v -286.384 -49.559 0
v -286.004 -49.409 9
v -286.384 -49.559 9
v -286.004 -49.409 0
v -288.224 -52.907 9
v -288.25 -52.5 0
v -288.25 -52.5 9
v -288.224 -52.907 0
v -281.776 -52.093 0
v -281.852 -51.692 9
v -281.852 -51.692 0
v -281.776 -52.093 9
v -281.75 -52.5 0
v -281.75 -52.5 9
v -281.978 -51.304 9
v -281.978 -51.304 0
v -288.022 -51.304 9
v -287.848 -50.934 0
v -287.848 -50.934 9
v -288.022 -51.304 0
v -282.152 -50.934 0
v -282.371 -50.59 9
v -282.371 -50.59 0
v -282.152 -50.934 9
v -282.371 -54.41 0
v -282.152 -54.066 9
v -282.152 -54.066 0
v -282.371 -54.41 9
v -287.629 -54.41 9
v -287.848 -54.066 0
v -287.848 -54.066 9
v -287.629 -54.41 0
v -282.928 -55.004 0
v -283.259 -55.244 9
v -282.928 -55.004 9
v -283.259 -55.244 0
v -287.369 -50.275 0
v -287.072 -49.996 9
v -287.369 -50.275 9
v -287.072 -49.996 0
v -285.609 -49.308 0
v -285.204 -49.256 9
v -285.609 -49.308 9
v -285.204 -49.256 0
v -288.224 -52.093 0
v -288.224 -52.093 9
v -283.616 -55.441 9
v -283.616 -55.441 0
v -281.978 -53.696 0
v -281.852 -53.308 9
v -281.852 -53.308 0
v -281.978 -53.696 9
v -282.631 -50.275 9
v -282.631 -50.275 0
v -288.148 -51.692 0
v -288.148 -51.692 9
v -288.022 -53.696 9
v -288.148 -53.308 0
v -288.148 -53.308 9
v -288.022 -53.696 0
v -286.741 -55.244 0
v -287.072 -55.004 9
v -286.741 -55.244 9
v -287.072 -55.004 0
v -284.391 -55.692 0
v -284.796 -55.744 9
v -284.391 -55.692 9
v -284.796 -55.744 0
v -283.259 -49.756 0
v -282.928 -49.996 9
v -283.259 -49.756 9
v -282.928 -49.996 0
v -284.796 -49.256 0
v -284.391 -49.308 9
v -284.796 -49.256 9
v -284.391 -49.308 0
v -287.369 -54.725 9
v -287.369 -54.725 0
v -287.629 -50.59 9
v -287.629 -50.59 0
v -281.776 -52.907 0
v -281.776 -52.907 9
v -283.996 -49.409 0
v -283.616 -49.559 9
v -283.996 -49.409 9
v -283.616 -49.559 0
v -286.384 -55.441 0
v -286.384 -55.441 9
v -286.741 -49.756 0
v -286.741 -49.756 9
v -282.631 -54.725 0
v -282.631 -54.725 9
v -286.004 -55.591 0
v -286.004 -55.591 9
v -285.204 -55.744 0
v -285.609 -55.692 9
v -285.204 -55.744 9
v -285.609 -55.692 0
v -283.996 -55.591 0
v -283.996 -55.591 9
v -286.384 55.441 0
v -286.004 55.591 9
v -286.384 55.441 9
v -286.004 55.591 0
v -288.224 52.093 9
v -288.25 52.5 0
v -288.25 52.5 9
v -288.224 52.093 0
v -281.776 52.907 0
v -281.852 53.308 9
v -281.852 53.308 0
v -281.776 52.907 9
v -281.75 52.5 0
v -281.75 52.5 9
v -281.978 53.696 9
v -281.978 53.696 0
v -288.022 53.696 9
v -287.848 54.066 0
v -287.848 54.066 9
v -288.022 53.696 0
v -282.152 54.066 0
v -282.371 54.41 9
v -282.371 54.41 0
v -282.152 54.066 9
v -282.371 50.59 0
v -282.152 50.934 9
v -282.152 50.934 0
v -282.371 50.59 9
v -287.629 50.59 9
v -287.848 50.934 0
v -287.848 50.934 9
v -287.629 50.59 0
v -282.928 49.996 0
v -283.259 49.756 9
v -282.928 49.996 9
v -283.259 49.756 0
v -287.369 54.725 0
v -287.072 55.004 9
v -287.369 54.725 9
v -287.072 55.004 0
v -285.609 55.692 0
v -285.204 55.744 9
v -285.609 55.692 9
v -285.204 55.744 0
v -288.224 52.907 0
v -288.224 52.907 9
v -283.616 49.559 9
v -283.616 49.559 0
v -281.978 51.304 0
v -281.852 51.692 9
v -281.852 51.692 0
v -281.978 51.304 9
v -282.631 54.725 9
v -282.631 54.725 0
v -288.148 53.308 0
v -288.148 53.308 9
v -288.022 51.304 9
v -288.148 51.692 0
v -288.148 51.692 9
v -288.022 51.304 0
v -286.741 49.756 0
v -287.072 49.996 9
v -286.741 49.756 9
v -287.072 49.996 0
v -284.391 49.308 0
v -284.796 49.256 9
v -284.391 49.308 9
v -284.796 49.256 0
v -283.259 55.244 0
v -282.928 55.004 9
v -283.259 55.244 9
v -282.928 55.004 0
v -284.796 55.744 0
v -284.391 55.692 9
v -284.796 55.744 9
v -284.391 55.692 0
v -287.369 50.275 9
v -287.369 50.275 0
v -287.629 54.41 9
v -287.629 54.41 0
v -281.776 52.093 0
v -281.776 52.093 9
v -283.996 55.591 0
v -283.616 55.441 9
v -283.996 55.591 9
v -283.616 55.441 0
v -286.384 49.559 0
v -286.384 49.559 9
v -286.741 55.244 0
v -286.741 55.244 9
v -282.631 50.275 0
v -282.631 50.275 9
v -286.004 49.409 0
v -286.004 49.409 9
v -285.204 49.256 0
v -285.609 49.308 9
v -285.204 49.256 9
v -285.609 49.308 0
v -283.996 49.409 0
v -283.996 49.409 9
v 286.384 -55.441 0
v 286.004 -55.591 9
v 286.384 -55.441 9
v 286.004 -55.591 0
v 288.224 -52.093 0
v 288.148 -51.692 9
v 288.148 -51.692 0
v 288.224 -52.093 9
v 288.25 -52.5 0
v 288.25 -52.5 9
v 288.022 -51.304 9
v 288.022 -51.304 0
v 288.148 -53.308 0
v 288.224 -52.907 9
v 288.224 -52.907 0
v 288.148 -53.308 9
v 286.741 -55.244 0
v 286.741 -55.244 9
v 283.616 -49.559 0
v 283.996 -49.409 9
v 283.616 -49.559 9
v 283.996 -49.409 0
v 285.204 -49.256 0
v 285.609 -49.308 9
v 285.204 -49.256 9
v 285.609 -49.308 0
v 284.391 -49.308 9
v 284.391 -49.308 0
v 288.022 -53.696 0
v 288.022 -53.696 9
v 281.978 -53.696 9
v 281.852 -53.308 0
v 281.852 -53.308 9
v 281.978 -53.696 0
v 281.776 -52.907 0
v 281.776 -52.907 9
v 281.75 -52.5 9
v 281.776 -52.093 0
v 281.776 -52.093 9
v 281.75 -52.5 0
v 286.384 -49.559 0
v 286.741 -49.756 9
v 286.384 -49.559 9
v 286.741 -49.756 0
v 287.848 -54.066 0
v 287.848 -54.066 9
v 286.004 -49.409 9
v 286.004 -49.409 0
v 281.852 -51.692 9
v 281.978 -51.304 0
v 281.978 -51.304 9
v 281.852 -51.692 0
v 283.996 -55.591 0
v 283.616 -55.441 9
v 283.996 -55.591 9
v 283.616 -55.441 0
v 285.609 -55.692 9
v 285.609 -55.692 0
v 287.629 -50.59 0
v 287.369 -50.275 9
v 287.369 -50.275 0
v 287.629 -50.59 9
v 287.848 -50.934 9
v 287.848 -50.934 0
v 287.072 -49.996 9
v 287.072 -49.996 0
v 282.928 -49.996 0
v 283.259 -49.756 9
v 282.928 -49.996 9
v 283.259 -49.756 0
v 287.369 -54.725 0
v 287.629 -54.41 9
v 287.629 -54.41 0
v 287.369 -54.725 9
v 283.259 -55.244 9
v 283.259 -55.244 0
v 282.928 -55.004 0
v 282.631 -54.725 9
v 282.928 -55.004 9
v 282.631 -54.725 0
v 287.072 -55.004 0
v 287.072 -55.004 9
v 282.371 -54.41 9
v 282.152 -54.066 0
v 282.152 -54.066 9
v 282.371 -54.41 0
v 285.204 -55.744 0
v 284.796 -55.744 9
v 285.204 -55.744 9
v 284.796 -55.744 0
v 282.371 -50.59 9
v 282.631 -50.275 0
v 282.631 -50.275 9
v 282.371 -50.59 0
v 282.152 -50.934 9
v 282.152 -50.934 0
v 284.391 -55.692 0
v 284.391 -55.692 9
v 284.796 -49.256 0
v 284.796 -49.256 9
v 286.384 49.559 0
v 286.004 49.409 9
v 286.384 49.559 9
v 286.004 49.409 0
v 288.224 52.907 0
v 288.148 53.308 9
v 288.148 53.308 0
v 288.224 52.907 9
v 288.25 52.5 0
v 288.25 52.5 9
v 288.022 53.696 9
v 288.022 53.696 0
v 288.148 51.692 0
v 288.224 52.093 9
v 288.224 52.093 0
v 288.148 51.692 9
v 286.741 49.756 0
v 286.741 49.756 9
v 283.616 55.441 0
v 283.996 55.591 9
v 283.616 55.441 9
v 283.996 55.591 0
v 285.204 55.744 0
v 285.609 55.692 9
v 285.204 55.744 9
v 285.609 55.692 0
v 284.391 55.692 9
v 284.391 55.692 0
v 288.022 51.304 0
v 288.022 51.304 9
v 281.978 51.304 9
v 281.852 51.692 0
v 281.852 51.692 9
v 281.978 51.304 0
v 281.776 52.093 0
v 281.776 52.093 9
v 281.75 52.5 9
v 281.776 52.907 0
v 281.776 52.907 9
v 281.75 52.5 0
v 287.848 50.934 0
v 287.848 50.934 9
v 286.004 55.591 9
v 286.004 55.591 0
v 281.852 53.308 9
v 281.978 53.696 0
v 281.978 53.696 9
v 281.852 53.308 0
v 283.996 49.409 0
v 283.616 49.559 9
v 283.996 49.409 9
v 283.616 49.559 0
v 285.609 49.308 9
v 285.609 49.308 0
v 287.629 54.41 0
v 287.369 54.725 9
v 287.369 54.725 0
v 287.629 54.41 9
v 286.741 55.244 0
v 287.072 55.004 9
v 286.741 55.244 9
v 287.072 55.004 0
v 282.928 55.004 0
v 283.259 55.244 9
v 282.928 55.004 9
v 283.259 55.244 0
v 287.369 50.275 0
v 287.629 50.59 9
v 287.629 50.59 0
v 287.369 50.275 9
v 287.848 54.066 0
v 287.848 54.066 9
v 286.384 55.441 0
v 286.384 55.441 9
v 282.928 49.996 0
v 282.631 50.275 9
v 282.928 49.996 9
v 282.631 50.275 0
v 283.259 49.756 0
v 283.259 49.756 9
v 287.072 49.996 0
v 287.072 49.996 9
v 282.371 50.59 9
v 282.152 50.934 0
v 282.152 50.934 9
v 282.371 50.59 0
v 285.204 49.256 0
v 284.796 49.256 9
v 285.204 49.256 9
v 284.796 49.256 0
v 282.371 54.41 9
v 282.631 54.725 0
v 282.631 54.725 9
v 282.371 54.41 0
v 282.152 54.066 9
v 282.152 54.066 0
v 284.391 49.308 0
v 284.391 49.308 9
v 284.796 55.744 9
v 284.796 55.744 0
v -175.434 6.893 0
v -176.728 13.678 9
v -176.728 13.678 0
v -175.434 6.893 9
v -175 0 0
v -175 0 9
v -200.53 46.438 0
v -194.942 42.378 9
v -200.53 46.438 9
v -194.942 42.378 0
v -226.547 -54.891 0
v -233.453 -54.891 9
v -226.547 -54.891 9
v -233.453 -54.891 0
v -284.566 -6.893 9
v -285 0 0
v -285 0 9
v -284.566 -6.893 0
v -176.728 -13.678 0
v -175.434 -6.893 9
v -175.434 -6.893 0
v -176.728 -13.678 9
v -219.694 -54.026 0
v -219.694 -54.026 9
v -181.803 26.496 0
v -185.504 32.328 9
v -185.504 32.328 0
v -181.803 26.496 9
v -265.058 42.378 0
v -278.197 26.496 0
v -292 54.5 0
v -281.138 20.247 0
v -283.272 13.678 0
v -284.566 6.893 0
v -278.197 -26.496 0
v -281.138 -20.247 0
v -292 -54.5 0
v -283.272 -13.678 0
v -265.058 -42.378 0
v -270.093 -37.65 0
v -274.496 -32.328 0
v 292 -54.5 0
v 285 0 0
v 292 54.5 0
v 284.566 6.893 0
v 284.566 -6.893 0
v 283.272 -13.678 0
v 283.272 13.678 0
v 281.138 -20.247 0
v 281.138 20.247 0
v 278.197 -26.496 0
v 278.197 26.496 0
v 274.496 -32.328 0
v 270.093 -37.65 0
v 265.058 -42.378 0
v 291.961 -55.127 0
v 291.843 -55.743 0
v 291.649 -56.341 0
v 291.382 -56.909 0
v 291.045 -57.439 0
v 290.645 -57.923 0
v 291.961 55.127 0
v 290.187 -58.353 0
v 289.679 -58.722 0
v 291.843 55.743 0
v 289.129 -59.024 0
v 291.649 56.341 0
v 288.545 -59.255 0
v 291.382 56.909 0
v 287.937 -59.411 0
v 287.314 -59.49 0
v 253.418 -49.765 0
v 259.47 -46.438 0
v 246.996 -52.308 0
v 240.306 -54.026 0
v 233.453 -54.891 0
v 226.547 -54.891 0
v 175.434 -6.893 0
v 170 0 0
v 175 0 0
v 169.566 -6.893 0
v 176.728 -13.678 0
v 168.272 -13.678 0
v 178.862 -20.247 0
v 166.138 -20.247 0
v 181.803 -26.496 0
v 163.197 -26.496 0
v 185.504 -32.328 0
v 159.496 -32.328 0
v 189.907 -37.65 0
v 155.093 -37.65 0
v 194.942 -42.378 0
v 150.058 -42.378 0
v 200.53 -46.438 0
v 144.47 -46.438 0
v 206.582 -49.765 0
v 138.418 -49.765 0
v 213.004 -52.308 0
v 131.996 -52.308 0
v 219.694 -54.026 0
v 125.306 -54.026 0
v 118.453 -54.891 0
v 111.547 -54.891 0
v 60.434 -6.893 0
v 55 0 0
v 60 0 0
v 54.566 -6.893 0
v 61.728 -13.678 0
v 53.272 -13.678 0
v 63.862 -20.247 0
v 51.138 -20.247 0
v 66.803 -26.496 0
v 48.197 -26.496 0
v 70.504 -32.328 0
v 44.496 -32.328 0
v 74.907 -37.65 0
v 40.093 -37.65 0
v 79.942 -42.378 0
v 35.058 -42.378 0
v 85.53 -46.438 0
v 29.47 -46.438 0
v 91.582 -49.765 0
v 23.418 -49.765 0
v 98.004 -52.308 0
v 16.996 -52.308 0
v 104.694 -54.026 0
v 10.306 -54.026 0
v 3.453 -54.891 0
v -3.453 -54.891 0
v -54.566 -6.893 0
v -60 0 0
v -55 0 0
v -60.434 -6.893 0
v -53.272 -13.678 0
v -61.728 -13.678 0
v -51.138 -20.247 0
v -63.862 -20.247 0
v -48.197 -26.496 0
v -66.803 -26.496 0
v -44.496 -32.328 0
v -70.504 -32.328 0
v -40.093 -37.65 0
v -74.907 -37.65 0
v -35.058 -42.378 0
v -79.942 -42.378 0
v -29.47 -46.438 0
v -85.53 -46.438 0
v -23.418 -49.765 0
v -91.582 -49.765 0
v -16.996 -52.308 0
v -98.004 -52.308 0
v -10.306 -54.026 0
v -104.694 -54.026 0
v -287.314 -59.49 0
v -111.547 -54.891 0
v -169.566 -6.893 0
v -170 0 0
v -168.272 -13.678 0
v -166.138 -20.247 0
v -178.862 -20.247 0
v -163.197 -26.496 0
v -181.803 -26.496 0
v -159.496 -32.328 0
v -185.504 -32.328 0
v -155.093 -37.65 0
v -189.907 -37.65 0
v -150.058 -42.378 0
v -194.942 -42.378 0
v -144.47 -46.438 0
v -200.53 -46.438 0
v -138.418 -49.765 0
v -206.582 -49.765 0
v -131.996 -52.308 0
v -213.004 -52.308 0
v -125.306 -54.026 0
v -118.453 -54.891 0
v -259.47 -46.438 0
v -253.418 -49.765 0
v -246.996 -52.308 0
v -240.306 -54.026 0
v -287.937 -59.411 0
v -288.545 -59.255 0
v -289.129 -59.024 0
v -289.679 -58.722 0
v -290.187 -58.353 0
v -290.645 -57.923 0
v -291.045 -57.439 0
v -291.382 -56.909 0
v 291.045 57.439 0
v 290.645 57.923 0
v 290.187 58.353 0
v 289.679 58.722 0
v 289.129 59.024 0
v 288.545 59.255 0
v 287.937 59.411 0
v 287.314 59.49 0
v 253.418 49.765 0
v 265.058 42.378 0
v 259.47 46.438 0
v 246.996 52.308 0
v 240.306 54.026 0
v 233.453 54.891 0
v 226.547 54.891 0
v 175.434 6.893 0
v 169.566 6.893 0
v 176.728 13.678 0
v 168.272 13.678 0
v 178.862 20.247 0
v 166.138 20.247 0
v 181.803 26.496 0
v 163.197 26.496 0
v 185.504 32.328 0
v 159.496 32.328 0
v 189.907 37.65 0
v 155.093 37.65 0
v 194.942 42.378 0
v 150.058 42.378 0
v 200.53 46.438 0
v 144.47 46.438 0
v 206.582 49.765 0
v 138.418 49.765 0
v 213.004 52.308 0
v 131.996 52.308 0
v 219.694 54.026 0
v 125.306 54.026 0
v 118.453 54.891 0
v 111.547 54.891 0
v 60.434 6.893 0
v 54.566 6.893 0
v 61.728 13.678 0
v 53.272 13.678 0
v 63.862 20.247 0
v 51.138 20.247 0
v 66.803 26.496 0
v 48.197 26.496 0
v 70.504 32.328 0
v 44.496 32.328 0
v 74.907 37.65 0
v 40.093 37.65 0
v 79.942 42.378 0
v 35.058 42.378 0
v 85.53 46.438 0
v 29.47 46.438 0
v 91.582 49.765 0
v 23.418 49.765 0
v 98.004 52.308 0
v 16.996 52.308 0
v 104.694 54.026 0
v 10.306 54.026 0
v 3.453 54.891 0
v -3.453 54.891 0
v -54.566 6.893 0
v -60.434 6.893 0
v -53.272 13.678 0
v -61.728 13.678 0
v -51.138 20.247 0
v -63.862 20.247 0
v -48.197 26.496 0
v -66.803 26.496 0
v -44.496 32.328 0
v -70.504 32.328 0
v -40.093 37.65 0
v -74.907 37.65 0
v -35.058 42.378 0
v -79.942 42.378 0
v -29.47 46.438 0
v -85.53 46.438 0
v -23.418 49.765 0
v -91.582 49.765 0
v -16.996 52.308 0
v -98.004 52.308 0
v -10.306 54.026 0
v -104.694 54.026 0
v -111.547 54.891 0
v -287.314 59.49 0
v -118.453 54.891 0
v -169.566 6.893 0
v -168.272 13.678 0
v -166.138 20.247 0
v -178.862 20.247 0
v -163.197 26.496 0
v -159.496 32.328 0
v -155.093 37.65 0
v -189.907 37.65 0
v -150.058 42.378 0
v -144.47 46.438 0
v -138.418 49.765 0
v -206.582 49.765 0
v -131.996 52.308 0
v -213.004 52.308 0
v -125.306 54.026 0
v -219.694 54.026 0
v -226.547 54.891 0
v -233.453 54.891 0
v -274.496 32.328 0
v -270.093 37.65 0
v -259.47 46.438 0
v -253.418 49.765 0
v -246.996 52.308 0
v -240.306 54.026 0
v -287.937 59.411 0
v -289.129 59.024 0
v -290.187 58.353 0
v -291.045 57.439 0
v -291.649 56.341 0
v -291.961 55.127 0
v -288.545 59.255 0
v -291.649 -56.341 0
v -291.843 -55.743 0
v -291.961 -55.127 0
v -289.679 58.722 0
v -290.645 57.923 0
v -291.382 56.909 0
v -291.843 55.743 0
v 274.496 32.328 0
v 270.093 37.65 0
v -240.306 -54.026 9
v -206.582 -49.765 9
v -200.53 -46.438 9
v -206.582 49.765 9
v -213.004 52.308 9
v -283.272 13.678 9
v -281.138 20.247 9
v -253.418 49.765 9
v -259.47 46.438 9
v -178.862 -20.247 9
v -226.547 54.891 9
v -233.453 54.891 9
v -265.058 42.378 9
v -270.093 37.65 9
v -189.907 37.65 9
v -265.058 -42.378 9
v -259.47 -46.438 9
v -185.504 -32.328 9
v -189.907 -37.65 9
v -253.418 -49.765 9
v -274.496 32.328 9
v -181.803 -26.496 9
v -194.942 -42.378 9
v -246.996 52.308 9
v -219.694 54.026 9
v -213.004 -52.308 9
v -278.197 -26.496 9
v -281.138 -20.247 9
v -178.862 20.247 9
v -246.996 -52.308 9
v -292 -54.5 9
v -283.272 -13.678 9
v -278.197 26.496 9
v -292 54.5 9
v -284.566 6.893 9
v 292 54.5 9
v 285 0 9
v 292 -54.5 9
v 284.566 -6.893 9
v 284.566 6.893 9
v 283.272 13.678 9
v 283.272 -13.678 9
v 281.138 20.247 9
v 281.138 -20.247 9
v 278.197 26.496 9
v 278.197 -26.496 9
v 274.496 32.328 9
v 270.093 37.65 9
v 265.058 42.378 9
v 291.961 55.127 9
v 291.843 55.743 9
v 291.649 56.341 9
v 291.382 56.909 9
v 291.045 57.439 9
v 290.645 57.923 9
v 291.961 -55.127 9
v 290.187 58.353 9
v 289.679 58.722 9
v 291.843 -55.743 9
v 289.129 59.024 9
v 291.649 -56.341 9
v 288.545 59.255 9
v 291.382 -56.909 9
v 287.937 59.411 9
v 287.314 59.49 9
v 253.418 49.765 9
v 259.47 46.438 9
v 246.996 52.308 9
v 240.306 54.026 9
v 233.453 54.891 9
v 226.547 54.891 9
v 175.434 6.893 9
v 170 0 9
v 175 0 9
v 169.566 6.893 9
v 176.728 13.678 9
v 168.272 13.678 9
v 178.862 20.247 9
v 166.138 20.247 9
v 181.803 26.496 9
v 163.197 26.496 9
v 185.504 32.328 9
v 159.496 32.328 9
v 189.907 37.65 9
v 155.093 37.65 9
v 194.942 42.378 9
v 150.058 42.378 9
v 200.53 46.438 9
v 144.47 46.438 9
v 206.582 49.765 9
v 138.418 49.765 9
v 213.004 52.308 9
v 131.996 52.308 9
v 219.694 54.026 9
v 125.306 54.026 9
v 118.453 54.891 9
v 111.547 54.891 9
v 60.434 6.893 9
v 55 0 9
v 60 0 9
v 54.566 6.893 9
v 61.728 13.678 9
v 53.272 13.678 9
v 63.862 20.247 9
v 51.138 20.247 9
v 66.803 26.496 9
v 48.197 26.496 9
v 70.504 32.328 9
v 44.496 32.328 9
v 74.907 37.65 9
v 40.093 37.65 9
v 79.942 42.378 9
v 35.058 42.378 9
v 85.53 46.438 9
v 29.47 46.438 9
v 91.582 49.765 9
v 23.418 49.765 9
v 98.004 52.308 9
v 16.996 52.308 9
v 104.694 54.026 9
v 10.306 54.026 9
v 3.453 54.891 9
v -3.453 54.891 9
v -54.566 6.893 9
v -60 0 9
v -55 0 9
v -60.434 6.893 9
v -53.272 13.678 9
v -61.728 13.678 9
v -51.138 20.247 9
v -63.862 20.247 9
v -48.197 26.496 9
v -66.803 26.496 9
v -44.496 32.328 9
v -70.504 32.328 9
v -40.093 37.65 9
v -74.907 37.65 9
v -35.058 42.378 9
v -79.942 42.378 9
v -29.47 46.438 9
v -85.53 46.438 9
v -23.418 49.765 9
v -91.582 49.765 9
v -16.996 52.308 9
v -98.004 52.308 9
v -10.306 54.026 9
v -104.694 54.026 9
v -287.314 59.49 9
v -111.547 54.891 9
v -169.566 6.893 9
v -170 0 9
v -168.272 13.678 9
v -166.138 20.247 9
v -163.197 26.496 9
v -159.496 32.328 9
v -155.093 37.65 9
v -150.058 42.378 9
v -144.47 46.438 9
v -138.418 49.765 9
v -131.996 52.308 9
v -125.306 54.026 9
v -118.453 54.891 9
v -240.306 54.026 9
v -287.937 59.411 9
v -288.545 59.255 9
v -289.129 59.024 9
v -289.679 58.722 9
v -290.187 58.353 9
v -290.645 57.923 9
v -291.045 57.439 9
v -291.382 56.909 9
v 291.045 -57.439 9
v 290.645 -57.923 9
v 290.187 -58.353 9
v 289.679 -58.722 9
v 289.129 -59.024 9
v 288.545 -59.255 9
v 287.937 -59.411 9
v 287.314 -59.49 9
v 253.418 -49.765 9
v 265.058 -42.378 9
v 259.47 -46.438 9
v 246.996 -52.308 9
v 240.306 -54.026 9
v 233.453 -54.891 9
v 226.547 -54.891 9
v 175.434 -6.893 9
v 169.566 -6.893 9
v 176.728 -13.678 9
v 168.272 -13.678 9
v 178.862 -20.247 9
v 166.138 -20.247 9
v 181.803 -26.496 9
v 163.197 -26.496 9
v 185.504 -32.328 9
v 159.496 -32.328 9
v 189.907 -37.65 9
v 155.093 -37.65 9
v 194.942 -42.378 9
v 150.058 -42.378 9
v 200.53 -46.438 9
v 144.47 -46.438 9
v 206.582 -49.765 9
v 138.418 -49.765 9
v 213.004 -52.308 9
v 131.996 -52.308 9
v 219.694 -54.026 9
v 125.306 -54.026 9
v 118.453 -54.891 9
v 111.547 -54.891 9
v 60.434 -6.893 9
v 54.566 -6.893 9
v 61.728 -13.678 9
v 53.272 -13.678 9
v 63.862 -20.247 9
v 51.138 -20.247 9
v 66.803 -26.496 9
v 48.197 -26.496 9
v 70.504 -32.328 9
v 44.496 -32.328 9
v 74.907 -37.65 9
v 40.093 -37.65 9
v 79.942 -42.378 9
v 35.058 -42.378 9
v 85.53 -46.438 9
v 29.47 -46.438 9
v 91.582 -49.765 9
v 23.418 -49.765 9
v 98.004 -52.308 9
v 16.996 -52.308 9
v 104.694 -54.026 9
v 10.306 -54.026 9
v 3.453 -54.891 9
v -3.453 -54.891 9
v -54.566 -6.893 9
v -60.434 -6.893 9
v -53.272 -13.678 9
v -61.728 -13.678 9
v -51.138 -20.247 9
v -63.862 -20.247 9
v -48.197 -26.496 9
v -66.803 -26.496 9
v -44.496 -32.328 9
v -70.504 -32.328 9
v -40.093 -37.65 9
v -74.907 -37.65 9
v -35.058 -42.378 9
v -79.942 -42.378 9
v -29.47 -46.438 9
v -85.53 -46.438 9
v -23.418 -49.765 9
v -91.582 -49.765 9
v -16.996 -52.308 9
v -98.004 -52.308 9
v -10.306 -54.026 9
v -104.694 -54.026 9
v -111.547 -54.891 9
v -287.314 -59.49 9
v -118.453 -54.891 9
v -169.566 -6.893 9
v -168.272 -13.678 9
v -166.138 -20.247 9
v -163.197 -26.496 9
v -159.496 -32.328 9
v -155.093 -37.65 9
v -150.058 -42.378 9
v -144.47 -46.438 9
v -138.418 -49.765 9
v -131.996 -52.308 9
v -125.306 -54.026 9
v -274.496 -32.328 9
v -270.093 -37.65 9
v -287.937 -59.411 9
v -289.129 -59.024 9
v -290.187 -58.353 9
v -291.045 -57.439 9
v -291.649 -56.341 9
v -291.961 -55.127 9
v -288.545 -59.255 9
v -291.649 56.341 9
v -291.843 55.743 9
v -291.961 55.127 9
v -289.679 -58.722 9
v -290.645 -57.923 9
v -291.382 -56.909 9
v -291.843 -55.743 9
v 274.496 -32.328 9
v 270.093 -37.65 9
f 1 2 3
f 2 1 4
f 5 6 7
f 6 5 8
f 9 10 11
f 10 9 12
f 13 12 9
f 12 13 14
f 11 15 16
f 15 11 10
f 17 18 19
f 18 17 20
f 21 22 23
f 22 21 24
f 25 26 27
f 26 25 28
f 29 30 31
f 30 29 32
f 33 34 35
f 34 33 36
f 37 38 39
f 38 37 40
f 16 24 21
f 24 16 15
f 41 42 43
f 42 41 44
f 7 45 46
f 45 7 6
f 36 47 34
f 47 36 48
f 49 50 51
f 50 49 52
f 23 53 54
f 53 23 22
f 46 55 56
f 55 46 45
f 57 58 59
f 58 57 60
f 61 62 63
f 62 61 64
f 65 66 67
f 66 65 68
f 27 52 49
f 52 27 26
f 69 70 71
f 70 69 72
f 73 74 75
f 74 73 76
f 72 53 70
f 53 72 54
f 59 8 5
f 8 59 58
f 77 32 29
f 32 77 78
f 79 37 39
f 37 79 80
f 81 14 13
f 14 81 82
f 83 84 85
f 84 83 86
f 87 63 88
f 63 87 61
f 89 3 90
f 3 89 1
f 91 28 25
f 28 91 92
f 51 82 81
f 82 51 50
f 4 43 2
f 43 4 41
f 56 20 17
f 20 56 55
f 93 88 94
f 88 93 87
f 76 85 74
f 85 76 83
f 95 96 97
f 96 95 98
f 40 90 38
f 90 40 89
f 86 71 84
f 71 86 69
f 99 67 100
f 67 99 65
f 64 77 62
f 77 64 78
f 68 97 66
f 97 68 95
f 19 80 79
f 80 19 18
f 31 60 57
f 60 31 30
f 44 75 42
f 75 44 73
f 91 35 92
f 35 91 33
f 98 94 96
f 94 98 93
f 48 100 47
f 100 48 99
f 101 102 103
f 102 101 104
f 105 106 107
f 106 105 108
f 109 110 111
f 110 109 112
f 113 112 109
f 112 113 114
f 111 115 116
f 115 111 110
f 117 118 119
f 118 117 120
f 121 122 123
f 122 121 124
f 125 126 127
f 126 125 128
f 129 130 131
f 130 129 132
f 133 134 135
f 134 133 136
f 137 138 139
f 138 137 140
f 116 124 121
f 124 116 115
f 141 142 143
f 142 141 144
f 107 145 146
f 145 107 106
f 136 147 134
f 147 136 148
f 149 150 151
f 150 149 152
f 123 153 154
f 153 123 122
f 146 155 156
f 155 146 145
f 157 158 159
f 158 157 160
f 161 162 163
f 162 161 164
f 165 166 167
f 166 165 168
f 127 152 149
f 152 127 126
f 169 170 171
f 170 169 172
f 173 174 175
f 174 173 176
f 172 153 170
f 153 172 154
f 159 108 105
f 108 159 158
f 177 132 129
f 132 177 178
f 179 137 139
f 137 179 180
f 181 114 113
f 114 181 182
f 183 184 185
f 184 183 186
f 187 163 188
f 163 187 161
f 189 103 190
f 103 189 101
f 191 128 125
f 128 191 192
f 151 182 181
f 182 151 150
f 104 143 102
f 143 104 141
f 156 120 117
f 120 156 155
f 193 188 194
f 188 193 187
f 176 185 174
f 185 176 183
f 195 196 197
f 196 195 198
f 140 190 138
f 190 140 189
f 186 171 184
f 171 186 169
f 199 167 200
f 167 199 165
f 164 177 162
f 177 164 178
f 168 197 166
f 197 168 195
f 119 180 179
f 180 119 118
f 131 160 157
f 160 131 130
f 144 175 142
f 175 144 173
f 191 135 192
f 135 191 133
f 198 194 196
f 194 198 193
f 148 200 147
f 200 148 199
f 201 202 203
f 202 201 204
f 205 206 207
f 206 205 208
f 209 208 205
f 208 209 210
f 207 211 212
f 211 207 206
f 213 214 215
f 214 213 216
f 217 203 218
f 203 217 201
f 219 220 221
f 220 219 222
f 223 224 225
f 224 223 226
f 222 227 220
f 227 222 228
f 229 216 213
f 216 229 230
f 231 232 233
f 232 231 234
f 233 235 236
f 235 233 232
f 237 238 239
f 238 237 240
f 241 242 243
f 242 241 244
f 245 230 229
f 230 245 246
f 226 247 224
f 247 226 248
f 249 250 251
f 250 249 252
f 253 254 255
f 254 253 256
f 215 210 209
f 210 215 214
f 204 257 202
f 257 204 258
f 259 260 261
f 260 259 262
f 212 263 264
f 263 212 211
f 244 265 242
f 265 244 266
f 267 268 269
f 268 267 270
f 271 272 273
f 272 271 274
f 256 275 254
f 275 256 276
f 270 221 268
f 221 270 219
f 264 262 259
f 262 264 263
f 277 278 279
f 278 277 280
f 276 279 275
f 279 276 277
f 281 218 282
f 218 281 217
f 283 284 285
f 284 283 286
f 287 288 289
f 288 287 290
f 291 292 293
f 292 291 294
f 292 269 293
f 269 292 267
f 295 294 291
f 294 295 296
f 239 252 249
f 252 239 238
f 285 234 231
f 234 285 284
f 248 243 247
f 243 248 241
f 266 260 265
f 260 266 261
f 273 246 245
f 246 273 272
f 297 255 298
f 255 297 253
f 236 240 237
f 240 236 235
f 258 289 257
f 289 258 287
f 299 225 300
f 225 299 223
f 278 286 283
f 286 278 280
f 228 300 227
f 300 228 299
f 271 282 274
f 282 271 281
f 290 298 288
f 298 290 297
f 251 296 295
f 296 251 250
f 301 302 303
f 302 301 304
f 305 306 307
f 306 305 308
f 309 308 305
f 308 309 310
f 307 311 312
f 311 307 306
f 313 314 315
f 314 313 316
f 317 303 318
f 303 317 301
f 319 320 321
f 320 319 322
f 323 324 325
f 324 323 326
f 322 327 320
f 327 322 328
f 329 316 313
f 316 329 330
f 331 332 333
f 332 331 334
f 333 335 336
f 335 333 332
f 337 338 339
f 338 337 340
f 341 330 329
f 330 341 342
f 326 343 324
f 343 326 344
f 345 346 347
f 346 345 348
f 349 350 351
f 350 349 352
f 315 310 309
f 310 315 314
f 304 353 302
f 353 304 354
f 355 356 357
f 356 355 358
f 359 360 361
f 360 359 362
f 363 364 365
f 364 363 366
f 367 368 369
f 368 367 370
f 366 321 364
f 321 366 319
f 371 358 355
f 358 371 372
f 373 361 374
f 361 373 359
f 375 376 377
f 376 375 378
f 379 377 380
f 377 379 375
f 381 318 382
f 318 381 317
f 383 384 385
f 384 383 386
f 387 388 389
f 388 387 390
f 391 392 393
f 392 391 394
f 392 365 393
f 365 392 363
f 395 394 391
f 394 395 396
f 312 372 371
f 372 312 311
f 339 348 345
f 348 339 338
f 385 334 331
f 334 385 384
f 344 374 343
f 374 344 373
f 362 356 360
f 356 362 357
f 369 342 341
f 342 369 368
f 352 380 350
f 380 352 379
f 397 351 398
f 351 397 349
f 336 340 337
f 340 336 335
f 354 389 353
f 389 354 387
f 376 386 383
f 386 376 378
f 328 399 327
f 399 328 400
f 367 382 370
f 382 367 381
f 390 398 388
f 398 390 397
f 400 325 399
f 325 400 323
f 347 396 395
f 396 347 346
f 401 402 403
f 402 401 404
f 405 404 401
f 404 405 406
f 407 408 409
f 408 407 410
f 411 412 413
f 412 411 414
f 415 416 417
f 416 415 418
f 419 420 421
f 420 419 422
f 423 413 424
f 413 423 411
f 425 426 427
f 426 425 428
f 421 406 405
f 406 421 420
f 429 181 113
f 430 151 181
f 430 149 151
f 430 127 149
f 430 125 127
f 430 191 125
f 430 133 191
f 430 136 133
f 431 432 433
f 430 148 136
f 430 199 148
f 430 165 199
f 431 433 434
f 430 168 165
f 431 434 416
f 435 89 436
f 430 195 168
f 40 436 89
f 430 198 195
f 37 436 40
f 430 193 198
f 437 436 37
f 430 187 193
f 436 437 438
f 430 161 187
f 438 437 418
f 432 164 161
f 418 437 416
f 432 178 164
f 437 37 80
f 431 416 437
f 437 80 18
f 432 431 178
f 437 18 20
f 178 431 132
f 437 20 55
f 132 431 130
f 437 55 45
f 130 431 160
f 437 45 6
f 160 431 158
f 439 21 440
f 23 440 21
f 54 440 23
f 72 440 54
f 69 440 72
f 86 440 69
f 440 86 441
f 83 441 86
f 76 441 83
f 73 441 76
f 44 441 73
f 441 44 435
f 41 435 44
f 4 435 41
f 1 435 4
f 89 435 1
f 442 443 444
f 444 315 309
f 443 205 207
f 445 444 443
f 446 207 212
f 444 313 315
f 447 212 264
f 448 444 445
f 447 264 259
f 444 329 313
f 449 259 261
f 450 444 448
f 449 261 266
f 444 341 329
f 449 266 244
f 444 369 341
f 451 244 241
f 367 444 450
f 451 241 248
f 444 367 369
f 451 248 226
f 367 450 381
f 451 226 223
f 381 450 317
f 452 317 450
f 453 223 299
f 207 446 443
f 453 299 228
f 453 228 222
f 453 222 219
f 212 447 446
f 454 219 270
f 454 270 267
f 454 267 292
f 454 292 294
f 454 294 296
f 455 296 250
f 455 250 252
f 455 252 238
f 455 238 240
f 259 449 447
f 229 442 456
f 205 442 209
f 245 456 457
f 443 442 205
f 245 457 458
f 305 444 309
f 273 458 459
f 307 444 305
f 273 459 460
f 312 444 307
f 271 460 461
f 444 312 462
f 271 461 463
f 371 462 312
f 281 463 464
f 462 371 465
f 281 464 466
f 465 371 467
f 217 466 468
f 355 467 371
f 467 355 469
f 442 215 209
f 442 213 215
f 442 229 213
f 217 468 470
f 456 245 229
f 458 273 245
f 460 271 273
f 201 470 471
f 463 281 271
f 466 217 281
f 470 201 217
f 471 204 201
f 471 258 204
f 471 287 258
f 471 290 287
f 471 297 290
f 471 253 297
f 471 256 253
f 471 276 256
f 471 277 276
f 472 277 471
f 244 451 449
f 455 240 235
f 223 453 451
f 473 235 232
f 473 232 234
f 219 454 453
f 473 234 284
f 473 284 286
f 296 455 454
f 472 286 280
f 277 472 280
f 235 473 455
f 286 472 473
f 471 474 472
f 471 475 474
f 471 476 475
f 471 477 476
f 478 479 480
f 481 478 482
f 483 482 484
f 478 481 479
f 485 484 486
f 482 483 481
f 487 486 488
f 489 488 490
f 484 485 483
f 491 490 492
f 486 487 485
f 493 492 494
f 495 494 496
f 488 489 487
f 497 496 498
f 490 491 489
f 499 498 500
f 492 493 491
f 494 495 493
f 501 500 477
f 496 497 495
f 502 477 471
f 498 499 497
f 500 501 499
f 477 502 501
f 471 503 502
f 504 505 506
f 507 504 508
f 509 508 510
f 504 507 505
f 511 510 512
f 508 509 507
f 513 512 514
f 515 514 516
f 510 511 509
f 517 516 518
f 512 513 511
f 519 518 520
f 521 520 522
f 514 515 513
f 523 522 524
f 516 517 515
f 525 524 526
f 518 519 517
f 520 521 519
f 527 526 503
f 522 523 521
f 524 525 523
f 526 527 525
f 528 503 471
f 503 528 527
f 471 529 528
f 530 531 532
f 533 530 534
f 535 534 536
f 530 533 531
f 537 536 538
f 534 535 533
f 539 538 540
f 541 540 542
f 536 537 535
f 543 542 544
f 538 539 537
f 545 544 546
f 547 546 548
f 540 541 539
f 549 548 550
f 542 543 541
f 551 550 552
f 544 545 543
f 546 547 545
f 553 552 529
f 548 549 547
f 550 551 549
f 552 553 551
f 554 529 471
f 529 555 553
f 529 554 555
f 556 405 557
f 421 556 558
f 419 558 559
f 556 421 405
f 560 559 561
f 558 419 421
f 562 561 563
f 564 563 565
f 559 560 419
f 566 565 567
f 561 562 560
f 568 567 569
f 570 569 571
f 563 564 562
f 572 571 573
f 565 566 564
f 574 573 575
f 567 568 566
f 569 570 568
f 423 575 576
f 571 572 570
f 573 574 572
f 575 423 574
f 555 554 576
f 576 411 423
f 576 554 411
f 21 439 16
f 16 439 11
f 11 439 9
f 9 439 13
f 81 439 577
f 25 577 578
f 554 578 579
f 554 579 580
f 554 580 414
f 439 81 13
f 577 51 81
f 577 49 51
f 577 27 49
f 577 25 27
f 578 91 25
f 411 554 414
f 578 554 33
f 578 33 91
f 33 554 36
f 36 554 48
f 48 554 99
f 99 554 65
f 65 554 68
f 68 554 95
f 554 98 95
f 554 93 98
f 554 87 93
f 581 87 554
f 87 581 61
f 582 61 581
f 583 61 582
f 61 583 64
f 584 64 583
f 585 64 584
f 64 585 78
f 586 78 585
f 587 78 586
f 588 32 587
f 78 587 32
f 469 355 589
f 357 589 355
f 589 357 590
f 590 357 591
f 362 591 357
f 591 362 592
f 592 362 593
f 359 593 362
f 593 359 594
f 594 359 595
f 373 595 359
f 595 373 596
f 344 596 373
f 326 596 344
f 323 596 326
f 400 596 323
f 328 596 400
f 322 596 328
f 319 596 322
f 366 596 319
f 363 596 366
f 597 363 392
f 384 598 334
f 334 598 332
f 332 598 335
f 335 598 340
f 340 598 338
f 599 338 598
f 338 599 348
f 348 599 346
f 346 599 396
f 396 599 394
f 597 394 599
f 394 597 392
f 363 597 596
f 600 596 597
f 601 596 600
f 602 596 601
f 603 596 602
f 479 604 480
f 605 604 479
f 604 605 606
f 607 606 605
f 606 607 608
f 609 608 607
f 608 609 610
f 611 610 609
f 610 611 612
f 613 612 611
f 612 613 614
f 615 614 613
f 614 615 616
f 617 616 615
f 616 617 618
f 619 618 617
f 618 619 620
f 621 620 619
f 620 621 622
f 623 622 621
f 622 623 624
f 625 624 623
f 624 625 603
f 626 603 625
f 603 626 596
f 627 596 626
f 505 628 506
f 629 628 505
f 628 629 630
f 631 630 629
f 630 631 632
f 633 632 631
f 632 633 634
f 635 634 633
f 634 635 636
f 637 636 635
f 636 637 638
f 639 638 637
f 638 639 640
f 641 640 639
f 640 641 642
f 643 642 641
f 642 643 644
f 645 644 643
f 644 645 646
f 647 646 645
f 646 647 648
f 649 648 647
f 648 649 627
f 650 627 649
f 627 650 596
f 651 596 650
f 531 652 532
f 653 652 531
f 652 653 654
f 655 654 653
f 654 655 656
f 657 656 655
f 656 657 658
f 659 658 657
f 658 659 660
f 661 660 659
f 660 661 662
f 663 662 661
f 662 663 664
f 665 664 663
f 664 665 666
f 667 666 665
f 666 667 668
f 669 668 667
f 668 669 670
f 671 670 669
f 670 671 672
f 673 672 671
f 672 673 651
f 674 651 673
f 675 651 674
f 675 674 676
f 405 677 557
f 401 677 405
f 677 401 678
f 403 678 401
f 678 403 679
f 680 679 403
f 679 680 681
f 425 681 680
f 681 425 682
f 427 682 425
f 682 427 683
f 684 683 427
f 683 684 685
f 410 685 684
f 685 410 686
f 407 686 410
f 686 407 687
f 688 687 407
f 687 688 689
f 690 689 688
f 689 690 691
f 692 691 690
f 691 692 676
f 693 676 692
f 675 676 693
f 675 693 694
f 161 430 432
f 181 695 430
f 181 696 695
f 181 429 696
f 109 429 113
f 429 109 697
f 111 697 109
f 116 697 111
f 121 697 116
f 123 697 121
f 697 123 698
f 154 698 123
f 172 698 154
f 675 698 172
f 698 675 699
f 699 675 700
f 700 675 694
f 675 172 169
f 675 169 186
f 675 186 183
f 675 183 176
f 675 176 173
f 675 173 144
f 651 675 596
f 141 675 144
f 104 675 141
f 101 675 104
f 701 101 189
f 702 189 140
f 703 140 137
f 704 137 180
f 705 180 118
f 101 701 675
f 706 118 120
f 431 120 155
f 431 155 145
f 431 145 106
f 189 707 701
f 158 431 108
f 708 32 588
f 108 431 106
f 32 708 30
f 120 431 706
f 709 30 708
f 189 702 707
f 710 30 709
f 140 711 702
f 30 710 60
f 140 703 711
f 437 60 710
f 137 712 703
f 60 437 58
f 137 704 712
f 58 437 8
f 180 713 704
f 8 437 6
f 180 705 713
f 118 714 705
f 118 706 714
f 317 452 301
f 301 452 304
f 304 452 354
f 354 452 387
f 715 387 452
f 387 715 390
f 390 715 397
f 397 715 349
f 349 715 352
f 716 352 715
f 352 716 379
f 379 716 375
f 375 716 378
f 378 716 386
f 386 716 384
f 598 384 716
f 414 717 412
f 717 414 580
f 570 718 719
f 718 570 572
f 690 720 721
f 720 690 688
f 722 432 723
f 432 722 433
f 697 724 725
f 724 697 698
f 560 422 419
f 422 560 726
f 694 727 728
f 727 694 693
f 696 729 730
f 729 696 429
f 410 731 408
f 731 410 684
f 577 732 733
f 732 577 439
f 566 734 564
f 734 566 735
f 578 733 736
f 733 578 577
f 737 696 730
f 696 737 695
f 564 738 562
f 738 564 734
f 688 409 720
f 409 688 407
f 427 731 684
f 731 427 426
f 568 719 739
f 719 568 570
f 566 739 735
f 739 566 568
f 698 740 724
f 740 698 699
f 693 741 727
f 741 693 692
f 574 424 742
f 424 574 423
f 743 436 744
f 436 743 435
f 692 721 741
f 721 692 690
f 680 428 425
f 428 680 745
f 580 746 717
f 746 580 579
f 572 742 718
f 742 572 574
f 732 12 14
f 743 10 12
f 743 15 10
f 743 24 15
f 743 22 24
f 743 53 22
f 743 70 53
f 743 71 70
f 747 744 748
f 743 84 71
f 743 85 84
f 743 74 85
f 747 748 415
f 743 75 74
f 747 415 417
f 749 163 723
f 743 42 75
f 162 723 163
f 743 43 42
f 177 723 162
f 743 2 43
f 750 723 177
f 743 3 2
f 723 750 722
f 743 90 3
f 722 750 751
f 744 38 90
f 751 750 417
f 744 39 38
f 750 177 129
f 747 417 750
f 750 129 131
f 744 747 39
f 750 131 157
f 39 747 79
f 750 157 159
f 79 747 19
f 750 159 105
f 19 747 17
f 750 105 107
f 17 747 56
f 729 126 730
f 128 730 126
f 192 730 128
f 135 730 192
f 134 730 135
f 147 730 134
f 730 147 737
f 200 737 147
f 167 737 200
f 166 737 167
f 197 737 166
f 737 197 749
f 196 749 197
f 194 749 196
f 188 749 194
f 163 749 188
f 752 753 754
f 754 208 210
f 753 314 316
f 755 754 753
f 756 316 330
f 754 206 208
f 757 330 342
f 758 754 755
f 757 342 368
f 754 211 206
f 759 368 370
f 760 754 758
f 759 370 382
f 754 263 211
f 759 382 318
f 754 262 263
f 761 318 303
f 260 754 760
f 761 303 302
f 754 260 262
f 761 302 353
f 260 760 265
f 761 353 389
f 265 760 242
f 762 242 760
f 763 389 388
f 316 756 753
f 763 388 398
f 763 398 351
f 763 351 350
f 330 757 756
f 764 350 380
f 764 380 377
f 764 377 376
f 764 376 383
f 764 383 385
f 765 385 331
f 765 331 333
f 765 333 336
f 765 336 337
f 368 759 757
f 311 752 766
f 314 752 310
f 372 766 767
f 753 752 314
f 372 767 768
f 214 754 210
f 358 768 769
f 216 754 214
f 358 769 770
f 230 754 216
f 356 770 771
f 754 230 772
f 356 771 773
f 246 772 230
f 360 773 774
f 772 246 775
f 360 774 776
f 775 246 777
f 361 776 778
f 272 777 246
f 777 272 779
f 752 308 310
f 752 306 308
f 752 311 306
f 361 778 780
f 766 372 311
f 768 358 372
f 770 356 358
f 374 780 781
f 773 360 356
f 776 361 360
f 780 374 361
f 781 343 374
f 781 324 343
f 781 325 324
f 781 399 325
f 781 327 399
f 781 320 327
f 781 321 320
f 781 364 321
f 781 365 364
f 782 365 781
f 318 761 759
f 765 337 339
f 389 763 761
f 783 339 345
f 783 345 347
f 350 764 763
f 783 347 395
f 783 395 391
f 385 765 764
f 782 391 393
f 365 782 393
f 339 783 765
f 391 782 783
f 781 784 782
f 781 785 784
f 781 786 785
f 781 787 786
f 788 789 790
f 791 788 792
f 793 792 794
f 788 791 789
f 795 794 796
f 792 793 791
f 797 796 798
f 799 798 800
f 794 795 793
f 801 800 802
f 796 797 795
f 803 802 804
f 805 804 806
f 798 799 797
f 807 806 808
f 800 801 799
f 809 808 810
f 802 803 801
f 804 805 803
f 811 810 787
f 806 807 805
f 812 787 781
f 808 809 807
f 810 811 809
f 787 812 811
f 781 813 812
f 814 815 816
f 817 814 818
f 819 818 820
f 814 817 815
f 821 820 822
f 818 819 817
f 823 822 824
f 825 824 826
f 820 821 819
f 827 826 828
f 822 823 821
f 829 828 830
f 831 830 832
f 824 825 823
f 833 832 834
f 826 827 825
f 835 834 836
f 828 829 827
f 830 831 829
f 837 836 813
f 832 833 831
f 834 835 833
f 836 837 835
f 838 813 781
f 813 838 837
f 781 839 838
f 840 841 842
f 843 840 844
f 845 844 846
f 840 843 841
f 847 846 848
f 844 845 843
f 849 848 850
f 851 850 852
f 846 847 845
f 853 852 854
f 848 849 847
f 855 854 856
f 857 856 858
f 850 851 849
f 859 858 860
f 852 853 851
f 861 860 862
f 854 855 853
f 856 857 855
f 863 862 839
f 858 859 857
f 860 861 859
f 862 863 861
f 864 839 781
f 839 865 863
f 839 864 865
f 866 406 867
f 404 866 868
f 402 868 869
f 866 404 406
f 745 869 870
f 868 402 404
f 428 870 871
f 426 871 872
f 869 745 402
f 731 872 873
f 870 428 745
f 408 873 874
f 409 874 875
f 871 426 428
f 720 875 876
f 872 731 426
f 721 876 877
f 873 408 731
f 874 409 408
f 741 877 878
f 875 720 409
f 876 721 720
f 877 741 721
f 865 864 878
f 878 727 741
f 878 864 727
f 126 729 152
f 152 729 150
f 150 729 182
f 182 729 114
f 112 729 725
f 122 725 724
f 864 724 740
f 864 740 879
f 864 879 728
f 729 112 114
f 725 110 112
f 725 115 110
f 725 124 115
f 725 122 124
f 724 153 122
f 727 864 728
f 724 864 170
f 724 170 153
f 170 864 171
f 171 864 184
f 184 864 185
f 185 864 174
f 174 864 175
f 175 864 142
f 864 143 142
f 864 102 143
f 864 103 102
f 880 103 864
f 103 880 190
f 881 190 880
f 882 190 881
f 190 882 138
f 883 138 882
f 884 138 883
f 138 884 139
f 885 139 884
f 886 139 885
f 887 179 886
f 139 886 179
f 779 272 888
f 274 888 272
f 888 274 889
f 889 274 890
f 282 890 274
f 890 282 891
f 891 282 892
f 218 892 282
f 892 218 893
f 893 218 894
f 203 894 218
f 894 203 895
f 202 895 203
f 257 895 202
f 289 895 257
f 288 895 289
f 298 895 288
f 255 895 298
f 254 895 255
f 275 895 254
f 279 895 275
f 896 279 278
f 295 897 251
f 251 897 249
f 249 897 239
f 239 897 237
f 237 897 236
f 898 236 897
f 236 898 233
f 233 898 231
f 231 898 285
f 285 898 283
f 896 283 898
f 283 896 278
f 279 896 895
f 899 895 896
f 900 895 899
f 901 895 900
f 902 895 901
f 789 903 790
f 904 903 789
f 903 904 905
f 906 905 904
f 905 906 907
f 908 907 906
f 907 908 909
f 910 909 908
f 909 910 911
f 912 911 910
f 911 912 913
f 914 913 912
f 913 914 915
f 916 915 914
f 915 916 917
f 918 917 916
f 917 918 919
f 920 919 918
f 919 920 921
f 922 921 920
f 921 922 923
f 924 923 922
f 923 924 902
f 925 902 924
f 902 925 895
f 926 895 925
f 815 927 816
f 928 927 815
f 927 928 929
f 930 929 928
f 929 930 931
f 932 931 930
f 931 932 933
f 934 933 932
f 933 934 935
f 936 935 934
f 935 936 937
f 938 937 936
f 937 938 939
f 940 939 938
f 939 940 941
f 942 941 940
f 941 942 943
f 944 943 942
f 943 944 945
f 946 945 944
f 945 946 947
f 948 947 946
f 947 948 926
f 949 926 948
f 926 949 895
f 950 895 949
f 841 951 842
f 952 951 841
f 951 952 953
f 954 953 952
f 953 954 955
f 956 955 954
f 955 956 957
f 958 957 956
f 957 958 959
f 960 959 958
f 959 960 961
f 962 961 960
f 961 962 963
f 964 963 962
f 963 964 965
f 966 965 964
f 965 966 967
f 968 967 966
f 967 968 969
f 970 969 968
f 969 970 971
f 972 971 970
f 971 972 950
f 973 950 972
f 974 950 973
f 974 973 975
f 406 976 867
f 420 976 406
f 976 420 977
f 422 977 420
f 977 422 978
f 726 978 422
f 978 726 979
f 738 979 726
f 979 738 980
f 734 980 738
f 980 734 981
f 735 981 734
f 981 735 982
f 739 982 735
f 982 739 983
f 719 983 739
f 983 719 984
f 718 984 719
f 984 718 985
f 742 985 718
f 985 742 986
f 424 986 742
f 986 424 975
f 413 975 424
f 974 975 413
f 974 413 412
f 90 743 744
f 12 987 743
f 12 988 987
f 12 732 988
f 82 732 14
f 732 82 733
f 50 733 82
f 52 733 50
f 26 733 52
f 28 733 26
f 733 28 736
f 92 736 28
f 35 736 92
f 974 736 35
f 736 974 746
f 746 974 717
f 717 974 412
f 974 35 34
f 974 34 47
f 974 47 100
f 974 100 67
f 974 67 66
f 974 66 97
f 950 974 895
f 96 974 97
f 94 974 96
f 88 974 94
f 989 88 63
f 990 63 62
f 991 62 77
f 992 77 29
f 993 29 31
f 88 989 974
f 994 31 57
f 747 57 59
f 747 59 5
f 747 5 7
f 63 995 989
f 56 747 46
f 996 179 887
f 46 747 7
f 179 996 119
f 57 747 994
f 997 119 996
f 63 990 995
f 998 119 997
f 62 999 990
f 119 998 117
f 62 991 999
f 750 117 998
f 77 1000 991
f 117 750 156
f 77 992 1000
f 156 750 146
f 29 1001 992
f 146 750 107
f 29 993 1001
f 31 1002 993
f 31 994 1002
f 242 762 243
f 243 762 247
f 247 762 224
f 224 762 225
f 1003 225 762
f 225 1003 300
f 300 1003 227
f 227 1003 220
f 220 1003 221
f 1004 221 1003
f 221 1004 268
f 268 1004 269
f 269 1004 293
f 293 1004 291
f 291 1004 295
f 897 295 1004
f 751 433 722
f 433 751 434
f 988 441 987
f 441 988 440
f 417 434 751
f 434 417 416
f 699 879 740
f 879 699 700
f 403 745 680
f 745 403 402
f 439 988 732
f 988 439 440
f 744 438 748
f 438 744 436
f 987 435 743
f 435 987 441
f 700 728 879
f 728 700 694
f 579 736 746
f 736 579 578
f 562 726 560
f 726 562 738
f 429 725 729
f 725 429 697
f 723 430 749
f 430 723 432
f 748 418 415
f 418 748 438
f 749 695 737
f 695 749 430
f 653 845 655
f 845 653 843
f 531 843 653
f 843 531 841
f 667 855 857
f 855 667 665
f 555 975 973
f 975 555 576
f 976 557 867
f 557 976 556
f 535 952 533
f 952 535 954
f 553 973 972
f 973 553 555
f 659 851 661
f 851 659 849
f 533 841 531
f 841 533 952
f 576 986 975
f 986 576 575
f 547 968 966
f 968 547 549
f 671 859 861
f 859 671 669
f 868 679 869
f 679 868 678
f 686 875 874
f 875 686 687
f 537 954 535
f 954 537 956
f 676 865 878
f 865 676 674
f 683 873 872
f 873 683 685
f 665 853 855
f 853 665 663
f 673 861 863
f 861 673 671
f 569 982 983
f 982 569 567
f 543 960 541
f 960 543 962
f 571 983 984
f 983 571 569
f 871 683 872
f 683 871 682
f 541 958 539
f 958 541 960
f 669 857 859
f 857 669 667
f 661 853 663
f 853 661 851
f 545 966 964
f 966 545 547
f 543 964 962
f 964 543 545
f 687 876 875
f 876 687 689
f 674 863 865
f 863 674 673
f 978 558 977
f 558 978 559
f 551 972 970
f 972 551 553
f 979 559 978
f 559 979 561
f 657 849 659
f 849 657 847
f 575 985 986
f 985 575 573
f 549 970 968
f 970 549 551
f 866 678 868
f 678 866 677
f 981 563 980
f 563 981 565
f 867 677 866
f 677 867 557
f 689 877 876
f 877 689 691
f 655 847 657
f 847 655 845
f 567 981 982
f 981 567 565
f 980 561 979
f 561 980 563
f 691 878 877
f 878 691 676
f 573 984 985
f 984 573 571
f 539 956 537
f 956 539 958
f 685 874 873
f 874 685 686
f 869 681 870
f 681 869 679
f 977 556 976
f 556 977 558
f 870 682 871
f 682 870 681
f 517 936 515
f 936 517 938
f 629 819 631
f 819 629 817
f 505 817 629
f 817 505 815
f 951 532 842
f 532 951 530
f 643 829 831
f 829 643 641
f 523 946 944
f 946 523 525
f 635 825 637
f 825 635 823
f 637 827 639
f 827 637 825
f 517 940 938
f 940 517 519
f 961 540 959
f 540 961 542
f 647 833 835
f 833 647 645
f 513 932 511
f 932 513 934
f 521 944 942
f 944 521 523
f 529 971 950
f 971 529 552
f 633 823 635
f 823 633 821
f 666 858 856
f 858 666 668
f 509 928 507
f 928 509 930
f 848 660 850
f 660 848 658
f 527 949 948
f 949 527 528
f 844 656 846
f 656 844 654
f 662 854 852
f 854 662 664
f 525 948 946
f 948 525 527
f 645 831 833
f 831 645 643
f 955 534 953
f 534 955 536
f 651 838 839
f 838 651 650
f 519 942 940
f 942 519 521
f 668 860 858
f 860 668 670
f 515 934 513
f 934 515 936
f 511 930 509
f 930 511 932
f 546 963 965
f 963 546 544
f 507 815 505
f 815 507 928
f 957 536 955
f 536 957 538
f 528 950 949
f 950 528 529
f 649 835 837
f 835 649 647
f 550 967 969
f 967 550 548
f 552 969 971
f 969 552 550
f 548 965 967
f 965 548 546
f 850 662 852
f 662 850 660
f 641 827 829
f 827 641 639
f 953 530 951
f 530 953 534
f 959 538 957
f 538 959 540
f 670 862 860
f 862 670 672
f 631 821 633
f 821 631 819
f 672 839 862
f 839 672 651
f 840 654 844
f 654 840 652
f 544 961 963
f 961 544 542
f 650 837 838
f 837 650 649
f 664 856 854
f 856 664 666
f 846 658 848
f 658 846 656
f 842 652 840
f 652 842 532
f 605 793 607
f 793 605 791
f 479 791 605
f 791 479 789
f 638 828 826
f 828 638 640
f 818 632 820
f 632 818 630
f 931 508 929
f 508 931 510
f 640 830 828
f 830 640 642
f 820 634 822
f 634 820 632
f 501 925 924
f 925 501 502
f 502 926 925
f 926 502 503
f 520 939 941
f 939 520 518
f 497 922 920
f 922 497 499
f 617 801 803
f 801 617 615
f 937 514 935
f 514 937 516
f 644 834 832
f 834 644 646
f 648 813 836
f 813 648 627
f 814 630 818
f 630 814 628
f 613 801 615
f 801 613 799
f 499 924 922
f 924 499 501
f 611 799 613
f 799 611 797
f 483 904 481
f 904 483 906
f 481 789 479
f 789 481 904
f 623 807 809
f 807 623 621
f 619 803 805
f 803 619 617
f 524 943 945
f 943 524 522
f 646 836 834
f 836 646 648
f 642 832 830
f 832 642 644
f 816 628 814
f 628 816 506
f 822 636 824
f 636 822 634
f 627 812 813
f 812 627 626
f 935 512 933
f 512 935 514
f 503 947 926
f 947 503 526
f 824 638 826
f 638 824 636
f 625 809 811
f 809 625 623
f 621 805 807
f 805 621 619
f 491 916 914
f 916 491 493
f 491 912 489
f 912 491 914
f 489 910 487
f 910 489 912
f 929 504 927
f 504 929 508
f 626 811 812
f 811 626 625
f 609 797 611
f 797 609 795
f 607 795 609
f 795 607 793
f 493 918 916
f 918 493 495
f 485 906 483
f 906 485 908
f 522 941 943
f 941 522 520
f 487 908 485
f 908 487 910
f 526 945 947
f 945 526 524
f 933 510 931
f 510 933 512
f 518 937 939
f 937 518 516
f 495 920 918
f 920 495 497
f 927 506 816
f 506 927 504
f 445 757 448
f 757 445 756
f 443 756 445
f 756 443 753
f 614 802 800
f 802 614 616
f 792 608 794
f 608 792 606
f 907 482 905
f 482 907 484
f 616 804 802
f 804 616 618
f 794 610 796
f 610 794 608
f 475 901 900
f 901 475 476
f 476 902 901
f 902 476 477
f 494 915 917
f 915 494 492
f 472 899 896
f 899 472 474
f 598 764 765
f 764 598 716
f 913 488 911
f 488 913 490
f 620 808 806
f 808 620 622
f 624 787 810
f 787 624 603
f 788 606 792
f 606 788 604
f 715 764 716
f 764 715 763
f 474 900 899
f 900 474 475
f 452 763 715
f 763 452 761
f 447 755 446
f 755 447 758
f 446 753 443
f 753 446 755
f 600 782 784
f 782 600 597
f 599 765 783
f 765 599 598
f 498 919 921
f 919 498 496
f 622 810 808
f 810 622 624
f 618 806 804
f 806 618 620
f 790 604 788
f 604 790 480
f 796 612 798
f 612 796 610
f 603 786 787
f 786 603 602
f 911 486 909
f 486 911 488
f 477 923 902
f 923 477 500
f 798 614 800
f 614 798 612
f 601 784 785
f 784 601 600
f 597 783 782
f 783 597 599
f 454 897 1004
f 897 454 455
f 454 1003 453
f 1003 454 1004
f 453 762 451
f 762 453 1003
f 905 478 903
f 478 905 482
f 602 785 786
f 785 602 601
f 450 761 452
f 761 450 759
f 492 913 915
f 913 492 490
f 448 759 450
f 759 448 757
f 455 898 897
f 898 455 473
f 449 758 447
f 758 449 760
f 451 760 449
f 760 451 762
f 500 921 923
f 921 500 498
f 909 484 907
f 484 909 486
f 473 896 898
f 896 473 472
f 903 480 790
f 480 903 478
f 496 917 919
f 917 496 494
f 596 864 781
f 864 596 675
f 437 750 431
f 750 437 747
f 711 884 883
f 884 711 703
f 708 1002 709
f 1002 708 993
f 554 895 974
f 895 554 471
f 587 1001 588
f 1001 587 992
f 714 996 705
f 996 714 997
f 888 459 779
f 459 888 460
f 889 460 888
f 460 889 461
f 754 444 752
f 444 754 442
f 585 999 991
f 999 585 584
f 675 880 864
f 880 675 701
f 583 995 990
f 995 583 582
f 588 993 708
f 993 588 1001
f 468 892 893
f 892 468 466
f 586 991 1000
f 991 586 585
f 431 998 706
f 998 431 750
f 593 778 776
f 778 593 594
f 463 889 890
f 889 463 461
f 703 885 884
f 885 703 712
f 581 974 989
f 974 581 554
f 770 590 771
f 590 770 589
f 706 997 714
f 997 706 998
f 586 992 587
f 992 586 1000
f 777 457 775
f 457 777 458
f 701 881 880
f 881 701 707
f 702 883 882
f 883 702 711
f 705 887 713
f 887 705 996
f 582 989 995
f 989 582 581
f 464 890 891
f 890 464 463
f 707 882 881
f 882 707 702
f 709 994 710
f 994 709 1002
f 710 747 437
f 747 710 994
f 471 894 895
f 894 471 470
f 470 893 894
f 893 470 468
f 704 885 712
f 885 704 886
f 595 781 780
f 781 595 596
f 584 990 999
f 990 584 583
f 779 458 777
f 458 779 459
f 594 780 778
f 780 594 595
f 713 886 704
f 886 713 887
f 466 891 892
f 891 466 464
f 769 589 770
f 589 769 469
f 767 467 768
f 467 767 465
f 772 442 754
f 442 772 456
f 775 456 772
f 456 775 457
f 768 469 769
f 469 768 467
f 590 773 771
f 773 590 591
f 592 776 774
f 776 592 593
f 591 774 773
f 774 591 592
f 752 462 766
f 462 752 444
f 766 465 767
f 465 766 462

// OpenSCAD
$fn = 50;


difference() {
	union() {
		hull() {
			translate(v = [-287.0000000000, 54.5000000000, 0]) {
				cylinder(h = 9, r = 5);
			}
			translate(v = [287.0000000000, 54.5000000000, 0]) {
				cylinder(h = 9, r = 5);
			}
			translate(v = [-287.0000000000, -54.5000000000, 0]) {
				cylinder(h = 9, r = 5);
			}
			translate(v = [287.0000000000, -54.5000000000, 0]) {
				cylinder(h = 9, r = 5);
			}
		}
	}
	union() {
		#translate(v = [-285.0000000000, -52.5000000000, -100.0000000000]) {
			cylinder(h = 200, r = 3.2500000000);
		}
		#translate(v = [-285.0000000000, 52.5000000000, -100.0000000000]) {
			cylinder(h = 200, r = 3.2500000000);
		}
		#translate(v = [285.0000000000, -52.5000000000, -100.0000000000]) {
			cylinder(h = 200, r = 3.2500000000);
		}
		#translate(v = [285.0000000000, 52.5000000000, -100.0000000000]) {
			cylinder(h = 200, r = 3.2500000000);
		}
		#translate(v = [-230.0000000000, 0, 0]) {
			cylinder(h = 9, r = 55.0000000000);
		}
		#translate(v = [-115.0000000000, 0, 0]) {
			cylinder(h = 9, r = 55.0000000000);
		}
		#cylinder(h = 9, r = 55.0000000000);
		#translate(v = [115.0000000000, 0, 0]) {
			cylinder(h = 9, r = 55.0000000000);
		}
		#translate(v = [230.0000000000, 0, 0]) {
			cylinder(h = 9, r = 55.0000000000);
		}
	}
}
